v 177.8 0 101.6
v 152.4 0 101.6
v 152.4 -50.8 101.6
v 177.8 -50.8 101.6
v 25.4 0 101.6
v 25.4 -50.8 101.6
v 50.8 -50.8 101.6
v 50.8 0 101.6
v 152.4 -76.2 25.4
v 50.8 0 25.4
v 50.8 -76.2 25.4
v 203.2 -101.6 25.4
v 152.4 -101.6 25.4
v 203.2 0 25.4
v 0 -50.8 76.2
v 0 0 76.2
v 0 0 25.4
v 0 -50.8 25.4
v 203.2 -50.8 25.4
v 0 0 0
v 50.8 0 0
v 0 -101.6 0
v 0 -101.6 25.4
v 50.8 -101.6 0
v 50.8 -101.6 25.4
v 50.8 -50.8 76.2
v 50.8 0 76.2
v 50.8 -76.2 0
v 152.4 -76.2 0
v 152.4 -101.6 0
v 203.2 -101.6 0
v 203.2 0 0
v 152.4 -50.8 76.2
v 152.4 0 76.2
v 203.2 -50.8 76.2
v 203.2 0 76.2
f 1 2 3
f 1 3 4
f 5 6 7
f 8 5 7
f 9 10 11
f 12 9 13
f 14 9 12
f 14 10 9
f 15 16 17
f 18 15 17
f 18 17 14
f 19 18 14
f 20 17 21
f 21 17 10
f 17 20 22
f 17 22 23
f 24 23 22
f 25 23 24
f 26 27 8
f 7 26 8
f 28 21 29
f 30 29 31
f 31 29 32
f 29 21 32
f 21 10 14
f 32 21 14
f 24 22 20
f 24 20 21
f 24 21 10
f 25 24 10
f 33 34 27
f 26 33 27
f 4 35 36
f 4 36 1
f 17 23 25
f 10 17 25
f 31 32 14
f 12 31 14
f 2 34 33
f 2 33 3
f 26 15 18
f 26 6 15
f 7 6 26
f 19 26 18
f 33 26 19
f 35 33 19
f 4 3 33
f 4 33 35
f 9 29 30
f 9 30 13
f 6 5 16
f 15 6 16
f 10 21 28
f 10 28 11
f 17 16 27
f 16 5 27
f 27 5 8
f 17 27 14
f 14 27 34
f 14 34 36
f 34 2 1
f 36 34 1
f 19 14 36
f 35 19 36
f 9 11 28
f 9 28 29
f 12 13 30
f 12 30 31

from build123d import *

# Parameters (mm, degrees)
F0_W     = 50.8
F0_H     = 25.4
F1_DEPTH = 101.6
F0_W_2   = 101.6
F2_DEPTH = 76.2
F3_DEPTH = 101.6
F0_W_3   = 25.4
F4_DEPTH = 50.8


with BuildPart() as f1:
    # F0 (on Front) → F1 (new body)
    with BuildSketch(Plane.XZ):
        with Locations((25.4, 12.7)):
            Rectangle(F0_W, F0_H)
    extrude(amount=F1_DEPTH)


with BuildPart() as f2:
    # F0 (on Front) → F2 (new body)
    with BuildSketch(Plane.XZ):
        with Locations((101.6, 12.7)):
            Rectangle(F0_W_2, F0_H)
    extrude(amount=F2_DEPTH)

    # F0 (on Front) → F3 (join)
    with BuildSketch(Plane.XZ):
        with Locations((177.8, 12.7)):
            Rectangle(F0_W, F0_H)
    extrude(amount=F3_DEPTH)


with BuildPart() as f4:
    # F0 (on Front) → F4 (new body)
    with BuildSketch(Plane.XZ):
        Polygon((0, 76.2), (0, 25.4), (50.8, 25.4), (152.4, 25.4), (203.2, 25.4), (203.2, 76.2), (177.8, 76.2), (152.4, 76.2), (50.8, 76.2), (25.4, 76.2), align=None)
        with Locations((38.1, 88.9)):
            Rectangle(F0_W_3, F0_H)
        Polygon((25.4, 101.6), (0, 76.2), (25.4, 76.2), align=None)
        with Locations((165.1, 88.9)):
            Rectangle(F0_W_3, F0_H)
        Polygon((177.8, 76.2), (203.2, 76.2), (177.8, 101.6), align=None)
    extrude(amount=F4_DEPTH)


solid = Compound([f1.part, f2.part, f4.part])
